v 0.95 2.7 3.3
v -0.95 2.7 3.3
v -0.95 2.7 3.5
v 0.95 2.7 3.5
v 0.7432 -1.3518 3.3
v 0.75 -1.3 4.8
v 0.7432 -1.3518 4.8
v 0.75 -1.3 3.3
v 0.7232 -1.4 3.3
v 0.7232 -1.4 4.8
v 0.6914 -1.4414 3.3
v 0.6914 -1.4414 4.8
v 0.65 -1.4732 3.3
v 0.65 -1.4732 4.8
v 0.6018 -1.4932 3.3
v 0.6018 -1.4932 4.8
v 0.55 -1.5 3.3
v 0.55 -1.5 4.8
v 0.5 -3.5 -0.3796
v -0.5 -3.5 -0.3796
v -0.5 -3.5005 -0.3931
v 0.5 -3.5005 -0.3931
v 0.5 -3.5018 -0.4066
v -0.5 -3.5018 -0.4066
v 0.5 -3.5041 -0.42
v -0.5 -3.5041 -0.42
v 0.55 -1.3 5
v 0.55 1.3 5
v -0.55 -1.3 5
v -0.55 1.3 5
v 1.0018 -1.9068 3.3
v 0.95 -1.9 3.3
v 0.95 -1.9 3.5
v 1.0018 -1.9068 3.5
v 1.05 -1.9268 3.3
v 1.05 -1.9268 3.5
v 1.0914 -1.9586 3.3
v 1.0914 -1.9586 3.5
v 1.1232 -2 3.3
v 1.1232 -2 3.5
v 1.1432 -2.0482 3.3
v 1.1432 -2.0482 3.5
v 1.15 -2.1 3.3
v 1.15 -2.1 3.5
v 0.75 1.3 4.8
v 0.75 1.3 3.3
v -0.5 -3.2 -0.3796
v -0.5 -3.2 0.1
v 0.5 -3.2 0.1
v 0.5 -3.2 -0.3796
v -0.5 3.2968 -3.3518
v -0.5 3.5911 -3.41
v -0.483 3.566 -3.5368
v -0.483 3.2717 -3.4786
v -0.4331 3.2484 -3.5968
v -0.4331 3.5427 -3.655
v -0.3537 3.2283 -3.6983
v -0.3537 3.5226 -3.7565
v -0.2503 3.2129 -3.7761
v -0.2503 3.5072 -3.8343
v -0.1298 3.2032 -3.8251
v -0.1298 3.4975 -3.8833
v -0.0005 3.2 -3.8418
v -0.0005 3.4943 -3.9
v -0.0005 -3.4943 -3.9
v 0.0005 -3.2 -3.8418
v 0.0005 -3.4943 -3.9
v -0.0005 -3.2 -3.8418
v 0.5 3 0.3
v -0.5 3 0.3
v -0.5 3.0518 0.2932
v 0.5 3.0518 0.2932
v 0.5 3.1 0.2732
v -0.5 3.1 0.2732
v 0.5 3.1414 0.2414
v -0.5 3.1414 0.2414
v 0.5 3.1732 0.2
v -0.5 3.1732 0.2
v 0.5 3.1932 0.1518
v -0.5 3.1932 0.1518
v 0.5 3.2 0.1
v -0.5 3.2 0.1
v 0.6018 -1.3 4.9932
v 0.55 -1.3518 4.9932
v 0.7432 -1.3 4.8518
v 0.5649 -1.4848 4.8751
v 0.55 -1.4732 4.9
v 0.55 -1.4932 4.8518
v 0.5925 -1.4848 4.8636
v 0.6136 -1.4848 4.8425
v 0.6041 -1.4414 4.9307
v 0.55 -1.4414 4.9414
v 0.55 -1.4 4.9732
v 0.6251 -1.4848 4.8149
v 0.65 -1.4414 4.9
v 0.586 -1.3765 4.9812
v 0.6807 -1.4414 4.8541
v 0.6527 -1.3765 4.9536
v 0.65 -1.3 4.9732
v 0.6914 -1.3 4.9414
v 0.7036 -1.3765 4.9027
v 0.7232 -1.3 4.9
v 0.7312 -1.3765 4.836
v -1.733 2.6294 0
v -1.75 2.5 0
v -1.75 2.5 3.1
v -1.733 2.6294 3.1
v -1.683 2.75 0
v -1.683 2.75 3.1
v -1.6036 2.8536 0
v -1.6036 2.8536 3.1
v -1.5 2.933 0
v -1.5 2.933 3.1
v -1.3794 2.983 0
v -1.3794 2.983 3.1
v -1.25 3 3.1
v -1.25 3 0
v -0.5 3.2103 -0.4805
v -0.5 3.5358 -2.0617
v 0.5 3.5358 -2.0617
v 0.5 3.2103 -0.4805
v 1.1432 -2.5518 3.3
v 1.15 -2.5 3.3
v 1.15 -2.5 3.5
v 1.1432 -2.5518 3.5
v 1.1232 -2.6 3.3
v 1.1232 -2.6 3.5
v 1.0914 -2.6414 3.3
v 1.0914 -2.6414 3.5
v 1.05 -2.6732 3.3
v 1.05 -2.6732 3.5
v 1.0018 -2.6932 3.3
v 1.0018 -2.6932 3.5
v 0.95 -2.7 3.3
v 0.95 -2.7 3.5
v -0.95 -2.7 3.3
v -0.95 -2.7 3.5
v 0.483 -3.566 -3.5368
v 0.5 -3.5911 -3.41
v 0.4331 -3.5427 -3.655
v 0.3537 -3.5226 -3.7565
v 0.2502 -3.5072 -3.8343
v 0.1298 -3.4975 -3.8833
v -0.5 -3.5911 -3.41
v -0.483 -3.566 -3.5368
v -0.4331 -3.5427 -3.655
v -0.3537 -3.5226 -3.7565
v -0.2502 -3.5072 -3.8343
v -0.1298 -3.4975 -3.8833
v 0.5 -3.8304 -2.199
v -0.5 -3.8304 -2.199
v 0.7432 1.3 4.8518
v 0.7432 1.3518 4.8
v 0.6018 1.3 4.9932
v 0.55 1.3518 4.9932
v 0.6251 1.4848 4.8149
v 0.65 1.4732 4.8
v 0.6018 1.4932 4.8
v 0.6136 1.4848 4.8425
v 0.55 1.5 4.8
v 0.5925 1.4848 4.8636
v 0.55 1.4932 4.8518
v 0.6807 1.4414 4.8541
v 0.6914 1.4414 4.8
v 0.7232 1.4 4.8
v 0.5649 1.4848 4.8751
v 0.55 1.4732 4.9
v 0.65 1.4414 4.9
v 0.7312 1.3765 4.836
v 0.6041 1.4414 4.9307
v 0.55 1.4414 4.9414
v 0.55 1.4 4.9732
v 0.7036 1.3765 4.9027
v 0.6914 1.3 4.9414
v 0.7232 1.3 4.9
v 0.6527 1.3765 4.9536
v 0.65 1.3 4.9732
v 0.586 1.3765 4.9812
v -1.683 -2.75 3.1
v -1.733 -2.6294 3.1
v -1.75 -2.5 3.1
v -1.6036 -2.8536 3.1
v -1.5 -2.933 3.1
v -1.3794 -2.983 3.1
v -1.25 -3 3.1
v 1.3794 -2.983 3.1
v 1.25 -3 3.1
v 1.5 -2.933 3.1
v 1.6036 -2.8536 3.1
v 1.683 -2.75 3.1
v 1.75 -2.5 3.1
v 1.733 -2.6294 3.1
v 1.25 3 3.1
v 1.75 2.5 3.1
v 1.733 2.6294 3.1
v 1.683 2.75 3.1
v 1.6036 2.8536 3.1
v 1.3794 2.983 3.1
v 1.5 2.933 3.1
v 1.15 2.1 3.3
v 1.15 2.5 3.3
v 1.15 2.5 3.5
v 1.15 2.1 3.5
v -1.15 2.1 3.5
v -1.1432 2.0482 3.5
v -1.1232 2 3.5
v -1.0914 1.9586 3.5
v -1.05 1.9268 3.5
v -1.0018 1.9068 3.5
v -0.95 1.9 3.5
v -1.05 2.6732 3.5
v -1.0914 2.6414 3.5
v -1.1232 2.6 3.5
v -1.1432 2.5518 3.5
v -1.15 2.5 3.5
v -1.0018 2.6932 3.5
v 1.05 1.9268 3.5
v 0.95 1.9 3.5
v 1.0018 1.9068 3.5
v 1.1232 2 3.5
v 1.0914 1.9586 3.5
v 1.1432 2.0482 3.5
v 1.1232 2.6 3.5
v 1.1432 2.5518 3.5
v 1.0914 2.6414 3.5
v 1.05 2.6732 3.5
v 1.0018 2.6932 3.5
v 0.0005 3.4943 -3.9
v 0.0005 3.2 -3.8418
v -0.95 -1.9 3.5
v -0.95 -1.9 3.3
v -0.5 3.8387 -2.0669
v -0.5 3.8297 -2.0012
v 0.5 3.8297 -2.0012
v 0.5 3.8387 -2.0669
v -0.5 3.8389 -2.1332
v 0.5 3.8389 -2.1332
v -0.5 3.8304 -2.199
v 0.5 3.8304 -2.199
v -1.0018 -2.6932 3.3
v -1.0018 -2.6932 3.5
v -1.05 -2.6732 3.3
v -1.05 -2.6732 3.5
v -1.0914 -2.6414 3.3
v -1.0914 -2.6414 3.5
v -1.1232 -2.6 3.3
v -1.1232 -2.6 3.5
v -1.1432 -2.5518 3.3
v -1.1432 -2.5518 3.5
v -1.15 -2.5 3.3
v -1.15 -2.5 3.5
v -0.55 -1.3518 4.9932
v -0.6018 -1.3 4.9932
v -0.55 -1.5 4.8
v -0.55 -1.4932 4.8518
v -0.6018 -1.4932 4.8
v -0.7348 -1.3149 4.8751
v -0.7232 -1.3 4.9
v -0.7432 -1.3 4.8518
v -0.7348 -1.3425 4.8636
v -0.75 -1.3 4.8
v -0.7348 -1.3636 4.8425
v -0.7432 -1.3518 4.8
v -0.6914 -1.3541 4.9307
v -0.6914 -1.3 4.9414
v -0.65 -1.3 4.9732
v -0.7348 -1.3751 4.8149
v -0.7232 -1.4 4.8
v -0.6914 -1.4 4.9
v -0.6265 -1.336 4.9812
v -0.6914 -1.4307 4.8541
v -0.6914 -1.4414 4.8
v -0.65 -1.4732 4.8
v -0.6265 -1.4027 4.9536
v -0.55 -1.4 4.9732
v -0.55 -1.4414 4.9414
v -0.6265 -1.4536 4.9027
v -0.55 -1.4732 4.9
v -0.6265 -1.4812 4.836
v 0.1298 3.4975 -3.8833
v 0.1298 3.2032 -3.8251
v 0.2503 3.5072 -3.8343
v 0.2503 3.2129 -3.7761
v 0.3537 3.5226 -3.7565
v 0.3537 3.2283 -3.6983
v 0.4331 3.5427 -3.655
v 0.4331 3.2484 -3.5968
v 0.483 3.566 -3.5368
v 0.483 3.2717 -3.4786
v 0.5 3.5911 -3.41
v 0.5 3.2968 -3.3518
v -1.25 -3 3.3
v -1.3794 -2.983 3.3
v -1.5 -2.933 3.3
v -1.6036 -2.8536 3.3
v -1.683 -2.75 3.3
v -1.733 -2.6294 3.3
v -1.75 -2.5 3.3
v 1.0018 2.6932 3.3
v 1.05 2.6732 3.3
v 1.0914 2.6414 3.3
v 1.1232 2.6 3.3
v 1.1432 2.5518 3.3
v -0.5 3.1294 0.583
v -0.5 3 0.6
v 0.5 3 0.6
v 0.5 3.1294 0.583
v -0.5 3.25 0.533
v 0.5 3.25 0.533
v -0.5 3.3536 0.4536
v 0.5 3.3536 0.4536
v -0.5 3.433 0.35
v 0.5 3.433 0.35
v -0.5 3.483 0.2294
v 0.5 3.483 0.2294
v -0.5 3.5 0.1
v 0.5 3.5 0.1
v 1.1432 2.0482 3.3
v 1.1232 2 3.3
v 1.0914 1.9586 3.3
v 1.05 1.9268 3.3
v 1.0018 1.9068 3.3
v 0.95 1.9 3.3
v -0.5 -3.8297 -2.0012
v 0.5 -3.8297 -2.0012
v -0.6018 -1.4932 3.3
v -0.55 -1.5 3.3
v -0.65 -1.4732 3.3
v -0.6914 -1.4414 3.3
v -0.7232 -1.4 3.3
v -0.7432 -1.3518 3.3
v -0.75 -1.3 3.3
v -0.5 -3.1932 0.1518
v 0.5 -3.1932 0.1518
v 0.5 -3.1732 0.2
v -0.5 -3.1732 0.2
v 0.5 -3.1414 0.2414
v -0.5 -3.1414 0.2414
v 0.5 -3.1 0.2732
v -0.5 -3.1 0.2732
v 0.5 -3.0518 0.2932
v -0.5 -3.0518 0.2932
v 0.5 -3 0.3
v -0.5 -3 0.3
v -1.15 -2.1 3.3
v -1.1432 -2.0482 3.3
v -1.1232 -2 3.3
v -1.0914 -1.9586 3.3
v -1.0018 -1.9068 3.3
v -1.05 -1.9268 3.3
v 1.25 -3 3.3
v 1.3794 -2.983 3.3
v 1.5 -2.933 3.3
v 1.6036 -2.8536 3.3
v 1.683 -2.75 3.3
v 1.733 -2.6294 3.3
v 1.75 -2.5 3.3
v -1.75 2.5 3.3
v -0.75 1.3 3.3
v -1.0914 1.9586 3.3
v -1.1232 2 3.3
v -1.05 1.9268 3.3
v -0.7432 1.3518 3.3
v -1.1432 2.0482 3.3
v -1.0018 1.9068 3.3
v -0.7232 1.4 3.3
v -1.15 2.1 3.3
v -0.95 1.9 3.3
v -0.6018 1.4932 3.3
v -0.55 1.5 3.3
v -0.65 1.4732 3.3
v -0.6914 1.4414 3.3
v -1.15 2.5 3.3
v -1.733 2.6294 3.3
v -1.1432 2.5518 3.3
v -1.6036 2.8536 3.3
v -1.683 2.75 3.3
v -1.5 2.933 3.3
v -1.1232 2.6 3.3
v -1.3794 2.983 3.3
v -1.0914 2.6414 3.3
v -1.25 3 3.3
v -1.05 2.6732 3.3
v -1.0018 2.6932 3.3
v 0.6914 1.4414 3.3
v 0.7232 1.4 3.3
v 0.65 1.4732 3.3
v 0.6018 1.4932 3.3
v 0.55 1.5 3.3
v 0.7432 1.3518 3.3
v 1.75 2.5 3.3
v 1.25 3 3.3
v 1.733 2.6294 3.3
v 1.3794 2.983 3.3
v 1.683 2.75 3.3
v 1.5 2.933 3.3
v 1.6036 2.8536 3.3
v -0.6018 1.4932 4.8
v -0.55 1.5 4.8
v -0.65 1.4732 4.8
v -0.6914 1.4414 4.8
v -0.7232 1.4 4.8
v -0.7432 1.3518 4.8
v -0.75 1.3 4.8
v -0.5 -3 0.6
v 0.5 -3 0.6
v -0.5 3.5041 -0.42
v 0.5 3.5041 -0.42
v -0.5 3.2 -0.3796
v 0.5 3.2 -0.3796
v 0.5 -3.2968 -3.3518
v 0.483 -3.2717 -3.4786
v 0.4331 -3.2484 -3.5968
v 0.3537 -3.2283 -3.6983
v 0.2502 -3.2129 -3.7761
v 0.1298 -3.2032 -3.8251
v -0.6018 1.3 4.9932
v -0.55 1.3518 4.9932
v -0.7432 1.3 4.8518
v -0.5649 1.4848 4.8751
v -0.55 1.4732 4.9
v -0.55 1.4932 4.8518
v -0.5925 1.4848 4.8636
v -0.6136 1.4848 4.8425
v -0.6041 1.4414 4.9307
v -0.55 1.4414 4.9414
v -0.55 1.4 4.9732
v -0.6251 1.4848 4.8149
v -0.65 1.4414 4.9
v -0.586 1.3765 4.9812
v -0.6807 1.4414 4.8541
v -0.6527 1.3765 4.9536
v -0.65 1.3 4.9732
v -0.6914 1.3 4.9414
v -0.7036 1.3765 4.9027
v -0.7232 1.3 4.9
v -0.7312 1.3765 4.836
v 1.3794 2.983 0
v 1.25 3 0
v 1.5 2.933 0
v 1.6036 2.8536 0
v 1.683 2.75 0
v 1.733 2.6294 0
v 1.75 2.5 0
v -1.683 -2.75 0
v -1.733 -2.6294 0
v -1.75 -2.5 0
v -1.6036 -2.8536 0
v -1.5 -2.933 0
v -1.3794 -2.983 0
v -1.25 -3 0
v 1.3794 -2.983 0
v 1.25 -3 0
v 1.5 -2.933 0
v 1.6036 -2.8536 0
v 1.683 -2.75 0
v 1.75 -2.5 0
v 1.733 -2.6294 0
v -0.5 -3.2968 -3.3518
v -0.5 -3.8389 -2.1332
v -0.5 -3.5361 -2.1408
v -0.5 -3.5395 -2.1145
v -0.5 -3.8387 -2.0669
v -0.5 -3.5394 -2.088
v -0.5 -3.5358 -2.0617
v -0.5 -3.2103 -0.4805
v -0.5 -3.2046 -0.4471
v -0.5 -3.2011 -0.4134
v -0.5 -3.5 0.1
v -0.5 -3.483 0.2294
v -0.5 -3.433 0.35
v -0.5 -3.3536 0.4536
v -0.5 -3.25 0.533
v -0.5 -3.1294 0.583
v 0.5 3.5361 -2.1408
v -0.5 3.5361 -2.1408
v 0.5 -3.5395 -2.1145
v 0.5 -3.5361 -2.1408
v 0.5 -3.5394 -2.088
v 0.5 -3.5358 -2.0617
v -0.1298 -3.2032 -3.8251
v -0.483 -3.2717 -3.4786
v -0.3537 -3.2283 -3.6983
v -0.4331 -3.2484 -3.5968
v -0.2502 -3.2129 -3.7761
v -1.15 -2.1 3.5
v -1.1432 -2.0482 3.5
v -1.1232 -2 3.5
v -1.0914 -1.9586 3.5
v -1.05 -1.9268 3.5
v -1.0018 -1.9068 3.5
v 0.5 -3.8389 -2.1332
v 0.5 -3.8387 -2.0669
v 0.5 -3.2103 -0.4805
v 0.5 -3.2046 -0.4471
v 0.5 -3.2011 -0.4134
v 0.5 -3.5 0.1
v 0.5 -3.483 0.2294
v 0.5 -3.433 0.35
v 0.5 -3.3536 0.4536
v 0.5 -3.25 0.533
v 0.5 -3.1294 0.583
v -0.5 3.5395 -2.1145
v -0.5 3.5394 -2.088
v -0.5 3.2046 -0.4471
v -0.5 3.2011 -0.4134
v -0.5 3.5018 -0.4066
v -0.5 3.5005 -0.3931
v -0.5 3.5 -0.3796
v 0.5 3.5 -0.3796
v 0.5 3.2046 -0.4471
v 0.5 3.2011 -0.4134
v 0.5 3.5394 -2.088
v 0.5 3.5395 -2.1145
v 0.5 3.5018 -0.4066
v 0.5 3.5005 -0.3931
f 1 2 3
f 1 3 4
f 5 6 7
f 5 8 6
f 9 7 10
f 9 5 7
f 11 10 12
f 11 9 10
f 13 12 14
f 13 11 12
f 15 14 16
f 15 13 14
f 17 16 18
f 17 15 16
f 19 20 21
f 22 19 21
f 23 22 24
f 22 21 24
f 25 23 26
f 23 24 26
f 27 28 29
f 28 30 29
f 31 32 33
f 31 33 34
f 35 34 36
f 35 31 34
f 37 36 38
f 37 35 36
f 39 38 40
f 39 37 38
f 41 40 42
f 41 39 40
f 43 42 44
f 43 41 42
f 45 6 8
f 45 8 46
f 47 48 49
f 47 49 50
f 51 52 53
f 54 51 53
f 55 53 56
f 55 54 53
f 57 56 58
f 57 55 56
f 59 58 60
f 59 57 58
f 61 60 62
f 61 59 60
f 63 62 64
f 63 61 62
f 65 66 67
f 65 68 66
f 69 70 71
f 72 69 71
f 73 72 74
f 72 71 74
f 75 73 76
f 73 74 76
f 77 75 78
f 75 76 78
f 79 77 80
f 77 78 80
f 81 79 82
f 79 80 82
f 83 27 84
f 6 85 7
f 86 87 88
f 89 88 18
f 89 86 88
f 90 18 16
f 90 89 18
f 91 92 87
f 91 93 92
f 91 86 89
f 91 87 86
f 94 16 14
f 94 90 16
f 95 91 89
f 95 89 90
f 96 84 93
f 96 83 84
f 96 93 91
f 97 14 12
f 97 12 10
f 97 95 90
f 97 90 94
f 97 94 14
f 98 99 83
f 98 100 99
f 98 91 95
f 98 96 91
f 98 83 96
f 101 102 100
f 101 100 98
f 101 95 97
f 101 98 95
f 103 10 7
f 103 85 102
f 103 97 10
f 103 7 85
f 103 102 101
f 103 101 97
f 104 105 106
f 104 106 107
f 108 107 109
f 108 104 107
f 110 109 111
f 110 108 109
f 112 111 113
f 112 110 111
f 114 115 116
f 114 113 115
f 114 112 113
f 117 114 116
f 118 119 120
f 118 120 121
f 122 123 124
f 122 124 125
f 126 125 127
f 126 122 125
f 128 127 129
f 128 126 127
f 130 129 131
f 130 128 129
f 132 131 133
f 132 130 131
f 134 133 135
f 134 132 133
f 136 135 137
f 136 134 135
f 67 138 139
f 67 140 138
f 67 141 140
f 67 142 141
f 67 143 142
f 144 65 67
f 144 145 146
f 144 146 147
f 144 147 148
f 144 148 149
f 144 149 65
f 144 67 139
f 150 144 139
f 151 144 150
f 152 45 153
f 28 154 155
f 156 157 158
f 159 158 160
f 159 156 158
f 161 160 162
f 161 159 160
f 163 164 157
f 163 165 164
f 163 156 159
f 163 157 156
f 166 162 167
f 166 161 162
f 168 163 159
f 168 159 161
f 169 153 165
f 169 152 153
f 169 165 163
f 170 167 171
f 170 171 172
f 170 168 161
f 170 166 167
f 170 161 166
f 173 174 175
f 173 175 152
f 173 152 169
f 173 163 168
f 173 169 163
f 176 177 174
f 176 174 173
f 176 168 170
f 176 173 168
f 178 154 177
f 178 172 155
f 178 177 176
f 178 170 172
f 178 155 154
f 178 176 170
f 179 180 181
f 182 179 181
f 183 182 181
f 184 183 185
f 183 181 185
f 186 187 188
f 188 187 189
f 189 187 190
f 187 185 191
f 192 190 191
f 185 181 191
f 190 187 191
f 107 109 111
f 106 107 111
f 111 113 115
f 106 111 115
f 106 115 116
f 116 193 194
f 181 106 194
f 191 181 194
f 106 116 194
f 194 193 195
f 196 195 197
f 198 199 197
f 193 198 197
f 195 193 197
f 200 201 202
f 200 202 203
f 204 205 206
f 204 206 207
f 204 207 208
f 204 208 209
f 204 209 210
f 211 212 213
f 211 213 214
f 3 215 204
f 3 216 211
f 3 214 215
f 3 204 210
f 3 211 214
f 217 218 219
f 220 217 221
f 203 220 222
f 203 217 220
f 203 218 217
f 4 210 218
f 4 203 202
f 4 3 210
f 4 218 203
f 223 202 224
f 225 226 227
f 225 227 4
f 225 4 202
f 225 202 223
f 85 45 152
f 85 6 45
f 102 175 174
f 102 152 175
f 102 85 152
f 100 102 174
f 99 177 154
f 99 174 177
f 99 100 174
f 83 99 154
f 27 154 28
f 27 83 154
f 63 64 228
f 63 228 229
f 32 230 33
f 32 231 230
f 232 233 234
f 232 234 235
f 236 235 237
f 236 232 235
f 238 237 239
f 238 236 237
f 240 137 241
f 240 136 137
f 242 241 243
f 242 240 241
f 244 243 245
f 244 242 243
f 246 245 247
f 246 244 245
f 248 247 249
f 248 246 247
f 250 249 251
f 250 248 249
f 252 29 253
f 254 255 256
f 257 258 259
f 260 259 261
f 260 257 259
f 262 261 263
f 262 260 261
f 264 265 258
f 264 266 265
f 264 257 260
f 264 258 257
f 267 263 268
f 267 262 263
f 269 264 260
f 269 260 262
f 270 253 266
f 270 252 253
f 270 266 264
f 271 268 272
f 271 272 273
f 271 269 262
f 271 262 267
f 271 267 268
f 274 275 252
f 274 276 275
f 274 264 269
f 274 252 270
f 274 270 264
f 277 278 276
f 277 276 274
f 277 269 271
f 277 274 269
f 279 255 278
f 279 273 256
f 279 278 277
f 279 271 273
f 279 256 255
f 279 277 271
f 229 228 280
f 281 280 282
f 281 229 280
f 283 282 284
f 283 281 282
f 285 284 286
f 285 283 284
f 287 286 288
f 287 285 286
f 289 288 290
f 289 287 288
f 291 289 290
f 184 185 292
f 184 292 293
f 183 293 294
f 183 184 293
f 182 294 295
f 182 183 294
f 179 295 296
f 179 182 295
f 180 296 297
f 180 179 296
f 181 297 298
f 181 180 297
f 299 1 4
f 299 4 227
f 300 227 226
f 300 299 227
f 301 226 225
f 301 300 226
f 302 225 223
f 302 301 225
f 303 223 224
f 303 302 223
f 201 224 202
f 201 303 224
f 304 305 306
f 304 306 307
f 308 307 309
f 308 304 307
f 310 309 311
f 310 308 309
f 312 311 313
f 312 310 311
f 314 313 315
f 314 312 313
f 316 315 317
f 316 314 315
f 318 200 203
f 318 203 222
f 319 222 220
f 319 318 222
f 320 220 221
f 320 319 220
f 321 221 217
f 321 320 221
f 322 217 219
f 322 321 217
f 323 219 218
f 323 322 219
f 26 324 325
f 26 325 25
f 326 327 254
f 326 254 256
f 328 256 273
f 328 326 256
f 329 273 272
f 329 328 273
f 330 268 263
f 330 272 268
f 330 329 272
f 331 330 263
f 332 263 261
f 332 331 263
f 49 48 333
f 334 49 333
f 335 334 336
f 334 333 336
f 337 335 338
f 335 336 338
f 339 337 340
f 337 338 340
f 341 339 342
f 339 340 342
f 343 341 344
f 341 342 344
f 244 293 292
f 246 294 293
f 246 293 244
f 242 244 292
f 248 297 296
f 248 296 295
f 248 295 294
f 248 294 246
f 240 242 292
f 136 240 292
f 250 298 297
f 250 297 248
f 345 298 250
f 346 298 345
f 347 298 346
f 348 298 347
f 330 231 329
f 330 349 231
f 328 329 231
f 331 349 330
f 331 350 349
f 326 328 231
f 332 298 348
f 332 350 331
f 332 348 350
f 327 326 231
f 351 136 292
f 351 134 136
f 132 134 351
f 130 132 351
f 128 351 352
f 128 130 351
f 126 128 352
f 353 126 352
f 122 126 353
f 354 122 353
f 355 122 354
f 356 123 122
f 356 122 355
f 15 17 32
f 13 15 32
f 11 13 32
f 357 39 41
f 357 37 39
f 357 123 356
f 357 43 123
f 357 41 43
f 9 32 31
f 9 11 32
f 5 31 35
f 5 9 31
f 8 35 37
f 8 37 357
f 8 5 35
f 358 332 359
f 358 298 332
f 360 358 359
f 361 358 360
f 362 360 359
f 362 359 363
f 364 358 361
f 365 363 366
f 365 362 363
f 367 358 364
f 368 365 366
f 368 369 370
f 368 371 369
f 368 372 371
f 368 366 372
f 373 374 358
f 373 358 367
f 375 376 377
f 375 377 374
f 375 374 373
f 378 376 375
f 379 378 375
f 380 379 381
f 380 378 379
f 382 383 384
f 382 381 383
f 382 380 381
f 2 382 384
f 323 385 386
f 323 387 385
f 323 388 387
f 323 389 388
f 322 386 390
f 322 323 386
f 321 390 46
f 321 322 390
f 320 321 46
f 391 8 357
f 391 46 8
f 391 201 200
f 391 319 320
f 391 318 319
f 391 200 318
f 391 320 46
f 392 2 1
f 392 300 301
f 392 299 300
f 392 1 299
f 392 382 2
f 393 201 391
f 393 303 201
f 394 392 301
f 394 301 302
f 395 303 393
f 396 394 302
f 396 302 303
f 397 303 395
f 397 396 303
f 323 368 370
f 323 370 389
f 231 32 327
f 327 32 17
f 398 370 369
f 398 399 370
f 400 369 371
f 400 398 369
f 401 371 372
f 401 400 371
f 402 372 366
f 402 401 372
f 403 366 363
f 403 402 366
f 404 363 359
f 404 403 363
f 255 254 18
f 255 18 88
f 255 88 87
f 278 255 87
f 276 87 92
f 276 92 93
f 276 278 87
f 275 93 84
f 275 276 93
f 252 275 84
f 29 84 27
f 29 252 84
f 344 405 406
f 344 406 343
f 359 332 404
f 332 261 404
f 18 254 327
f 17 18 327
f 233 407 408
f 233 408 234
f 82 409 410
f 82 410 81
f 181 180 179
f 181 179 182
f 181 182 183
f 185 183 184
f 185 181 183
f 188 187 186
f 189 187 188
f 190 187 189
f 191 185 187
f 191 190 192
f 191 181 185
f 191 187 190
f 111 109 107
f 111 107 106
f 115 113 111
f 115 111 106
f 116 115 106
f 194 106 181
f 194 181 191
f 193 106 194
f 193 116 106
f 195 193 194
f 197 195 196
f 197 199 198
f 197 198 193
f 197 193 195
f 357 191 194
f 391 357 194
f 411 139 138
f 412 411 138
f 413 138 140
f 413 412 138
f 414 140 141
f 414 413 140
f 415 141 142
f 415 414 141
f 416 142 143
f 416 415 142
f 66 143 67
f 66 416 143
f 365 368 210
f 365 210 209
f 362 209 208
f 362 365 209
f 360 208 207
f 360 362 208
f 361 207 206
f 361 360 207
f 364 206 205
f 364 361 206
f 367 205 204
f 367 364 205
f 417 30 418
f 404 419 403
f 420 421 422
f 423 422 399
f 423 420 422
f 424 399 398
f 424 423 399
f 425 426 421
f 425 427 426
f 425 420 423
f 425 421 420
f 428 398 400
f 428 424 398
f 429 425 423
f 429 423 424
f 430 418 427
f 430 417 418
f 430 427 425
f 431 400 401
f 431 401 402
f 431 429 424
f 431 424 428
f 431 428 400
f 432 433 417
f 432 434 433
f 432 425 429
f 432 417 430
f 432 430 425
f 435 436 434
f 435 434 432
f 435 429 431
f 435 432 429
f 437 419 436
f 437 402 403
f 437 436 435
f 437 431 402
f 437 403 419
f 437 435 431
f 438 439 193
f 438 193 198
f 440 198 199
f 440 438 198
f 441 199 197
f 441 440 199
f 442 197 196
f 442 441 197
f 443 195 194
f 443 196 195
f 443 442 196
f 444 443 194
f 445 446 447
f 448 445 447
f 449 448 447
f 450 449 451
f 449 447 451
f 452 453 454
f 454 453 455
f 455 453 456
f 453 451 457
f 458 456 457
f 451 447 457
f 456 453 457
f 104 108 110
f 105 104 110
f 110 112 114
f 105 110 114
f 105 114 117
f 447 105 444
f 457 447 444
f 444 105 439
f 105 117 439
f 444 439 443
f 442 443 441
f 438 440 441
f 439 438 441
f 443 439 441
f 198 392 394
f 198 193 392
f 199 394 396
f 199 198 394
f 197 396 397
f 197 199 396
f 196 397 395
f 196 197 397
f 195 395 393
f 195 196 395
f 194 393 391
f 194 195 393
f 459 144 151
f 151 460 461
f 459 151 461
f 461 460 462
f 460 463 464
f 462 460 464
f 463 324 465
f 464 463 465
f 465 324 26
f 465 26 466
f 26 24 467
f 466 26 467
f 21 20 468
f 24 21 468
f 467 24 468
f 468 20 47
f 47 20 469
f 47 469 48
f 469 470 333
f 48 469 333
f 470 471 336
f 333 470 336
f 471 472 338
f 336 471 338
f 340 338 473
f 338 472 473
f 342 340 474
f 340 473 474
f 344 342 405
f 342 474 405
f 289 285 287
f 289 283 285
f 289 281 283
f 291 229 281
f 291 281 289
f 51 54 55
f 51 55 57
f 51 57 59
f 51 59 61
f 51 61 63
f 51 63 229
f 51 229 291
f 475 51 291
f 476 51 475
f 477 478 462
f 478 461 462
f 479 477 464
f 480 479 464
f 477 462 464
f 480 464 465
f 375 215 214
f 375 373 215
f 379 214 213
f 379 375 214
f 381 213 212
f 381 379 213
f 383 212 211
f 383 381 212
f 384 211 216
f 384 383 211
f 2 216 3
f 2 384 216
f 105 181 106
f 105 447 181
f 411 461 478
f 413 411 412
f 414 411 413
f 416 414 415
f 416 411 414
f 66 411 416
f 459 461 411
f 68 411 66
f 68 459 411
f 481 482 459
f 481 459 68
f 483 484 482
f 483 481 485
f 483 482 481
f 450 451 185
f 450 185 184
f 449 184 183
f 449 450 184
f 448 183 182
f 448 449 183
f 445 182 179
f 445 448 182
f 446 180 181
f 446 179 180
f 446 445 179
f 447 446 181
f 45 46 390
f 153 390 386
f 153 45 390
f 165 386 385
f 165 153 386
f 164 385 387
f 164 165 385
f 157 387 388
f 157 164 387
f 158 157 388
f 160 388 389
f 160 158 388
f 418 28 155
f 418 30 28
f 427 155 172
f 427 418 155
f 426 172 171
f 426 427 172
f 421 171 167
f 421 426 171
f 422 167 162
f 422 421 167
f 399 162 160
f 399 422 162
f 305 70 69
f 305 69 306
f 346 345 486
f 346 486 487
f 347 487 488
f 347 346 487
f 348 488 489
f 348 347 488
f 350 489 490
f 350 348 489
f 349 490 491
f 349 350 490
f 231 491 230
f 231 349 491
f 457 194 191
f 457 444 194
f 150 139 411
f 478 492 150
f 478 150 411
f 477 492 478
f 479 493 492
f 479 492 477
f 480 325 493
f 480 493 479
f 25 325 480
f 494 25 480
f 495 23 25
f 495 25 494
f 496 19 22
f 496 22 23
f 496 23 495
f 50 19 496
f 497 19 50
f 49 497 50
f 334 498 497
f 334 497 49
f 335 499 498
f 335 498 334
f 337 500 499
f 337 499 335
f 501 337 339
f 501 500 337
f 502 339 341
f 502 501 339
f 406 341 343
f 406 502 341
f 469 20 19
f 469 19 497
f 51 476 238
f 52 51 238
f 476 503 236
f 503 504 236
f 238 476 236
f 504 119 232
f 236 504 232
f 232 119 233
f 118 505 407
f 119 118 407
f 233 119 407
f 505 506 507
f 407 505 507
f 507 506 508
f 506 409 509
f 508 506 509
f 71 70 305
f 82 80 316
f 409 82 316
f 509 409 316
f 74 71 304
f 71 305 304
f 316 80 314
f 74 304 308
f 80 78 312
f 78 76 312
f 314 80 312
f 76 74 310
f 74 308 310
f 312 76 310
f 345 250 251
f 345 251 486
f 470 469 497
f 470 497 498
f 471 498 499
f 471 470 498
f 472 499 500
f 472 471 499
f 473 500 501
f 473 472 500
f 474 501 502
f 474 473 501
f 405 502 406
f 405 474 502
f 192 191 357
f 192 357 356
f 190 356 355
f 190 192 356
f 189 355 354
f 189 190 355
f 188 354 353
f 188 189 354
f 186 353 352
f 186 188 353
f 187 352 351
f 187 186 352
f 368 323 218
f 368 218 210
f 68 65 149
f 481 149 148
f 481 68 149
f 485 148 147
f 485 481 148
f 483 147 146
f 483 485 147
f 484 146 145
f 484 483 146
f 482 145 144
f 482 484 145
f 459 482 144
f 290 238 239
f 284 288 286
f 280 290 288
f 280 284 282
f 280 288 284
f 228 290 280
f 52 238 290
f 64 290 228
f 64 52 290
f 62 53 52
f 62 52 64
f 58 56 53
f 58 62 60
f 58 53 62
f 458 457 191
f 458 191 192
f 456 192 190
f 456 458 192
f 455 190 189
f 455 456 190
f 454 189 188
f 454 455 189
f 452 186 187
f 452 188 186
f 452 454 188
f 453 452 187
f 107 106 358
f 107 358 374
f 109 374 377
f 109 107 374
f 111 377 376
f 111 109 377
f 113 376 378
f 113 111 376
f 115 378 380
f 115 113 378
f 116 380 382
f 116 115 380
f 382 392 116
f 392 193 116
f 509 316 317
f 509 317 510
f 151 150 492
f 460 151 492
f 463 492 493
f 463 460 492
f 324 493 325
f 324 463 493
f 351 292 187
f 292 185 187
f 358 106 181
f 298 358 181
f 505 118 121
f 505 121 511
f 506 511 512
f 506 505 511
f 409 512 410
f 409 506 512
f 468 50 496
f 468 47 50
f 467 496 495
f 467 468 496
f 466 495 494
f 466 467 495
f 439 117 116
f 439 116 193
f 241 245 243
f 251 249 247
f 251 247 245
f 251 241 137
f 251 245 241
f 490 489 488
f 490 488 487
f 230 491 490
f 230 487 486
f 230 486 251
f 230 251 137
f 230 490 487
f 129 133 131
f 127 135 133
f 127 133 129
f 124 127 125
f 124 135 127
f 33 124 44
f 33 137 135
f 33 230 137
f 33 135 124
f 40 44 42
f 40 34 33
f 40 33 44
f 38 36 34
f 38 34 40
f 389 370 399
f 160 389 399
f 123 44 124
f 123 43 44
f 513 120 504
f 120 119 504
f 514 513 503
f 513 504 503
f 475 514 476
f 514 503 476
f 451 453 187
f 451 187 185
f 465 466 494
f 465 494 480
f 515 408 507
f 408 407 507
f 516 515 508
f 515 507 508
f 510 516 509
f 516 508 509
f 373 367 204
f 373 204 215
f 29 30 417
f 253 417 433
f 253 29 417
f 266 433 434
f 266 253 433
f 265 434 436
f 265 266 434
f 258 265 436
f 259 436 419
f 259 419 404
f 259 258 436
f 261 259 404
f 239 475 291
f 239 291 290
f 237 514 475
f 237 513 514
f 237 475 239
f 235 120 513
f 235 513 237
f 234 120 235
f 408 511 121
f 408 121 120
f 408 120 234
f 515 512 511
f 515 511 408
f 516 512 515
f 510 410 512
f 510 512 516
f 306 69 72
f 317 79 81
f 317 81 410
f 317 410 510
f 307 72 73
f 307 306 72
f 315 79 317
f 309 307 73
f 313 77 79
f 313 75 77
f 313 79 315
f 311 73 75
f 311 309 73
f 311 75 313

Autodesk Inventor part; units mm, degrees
ref_plane "YZ Plane" through (0, 0, 0) normal (1, 0, 0) x (0, 1, 0)
ref_plane "XZ Plane" through (0, 0, 0) normal (0, 1, 0) x (-1, 0, 0)
ref_plane "XY Plane" through (0, 0, 0) normal (0, 0, 1) x (1, 0, 0)
sketch "Boceto39" plane through (0, 0, 0) normal (0, 0, 1) x (1, 0, 0)
  line L0 (-1.25, 3) -> (1.25, 3)
  line L1 (1.75, 2.5) -> (1.75, -2.5)
  line L2 (1.25, -3) -> (-1.25, -3)
  line L3 (-1.75, -2.5) -> (-1.75, 2.5)
  arc A0 (1.75, 2.5) -> (1.25, 3) centre (1.25, 2.5) ccw
  arc A1 (-1.25, 3) -> (-1.75, 2.5) centre (-1.25, 2.5) ccw
  arc A2 (-1.75, -2.5) -> (-1.25, -3) centre (-1.25, -2.5) ccw
  arc A3 (1.25, -3) -> (1.75, -2.5) centre (1.25, -2.5) ccw
  point P0 (0, 0)
  point P1 (-1.75, 3)
  point P2 (1.75, -3)
  point P3 (1.75, 3)
  point P4 (-1.75, -3)
  point P5 (0, 3)
  point P6 (1.75, 0)
  dimension "d373" = 3.5
  dimension "d376" = 0.5
  dimension "d437" = 6
extrude "Extrusión13" add sketch "Boceto39" along normal blind 3.1
sketch "Boceto40" plane through (0, 0, 3.1) normal (0, 0, 1) x (1, 0, 0)
  line L0 (1.25, 3) -> (-1.25, 3) projected
  arc A0 (-1.25, 3) -> (-1.75, 2.5) centre (-1.25, 2.5) ccw projected
  line L1 (-1.75, 2.5) -> (-1.75, -2.5) projected
  arc A1 (-1.75, -2.5) -> (-1.25, -3) centre (-1.25, -2.5) ccw projected
  line L2 (-1.25, -3) -> (1.25, -3) projected
  arc A2 (1.25, -3) -> (1.75, -2.5) centre (1.25, -2.5) ccw projected
  line L3 (1.75, -2.5) -> (1.75, 2.5) projected
  arc A3 (1.75, 2.5) -> (1.25, 3) centre (1.25, 2.5) ccw projected
  point P0 (0, 0)
extrude "Extrusión14" add sketch "Boceto40" along normal blind 0.2 separate body
sketch "Boceto43" plane through (0, 0, 0) normal (1, 0, 0) x (0, 1, 0)
  line L0 (0, 0) -> (0, -3.6276) construction
  line L1 (3, 0) -> (3, 3.1) construction
  line L2 (3, 0.6) -> (3, 0.6)
  line L3 (2.5, 3.3) -> (-2.5, 3.3) projected
  line L4 (2.5, 0) -> (-2.5, 0) projected
  line L5 (3.5, 0.1) -> (3.5, -0.3796)
  line L6 (3.5041, -0.42) -> (3.8297, -2.0012)
  line L7 (3.8304, -2.199) -> (3.4943, -3.9)
  line L8 (3.4943, -3.9) -> (3.2, -3.8418)
  line L9 (3.2, -3.8418) -> (3.5361, -2.1408)
  line L10 (3.5358, -2.0617) -> (3.2103, -0.4805)
  line L11 (3.2, -0.3796) -> (3.2, 0.1)
  line L12 (3, 0.3) -> (3, 0.3)
  line L13 (3, 0.3) -> (3, 0.6)
  arc A0 (3.2, 0.1) -> (3, 0.3) centre (3, 0.1) ccw
  arc A1 (3.5, -0.3796) -> (3.5041, -0.42) centre (3.7, -0.3796) ccw
  arc A2 (3.5361, -2.1408) -> (3.5358, -2.0617) centre (3.3399, -2.102) ccw
  arc A3 (3.5, 0.1) -> (3, 0.6) centre (3, 0.1) ccw
  arc A4 (3.2, -0.3796) -> (3.2103, -0.4805) centre (3.7, -0.3796) ccw
  arc A5 (3.8304, -2.199) -> (3.8297, -2.0012) centre (3.3399, -2.102) ccw
  point P0 (3.5, 0.6)
  point P1 (3.5, -0.4)
  point P2 (3.85, -2.1)
  point P3 (3.2, -0.4306)
  dimension "d399" = 2.7
  dimension "d426" = 0.3
  dimension "d427" = 0.3
  dimension "d428" = 0.3
  dimension "d429" = 0.3
  dimension "d430" = 3.85
  dimension "d431" = 3.2
  dimension "d432" = 3.9
  dimension "d433" = 1.8
  dimension "d434" = 1
  dimension "d435" = 0.2
  dimension "d436" = 0.5
extrude "Extrusión15" add sketch "Boceto43" along normal mid plane 1 separate body
fillet "Empalme44" radius 0.5 2 edges at (0.5, 3.3472, -3.8709) (-0.5, 3.3472, -3.8709)
mirror "Simetría1" about plane through (0, 0, 0) normal (0, 1, 0) of "Extrusión15", "Empalme44" bodies 3
sketch "Boceto49" plane through (0, 0, 3.3) normal (0, 0, 1) x (1, 0, 0)
  line L0 (0.95, -2.7) -> (-0.95, -2.7)
  line L1 (-1.15, -2.5) -> (-1.15, -2.1)
  line L2 (-0.95, -1.9) -> (0.95, -1.9)
  line L3 (1.15, -2.1) -> (1.15, -2.5)
  line L4 (0.95, 1.9) -> (-0.95, 1.9)
  line L5 (-1.15, 2.1) -> (-1.15, 2.5)
  line L6 (-0.95, 2.7) -> (0.95, 2.7)
  line L7 (1.15, 2.5) -> (1.15, 2.1)
  arc A0 (0.95, -2.7) -> (1.15, -2.5) centre (0.95, -2.5) ccw
  arc A1 (1.15, -2.1) -> (0.95, -1.9) centre (0.95, -2.1) ccw
  arc A2 (-0.95, -1.9) -> (-1.15, -2.1) centre (-0.95, -2.1) ccw
  arc A3 (-1.15, -2.5) -> (-0.95, -2.7) centre (-0.95, -2.5) ccw
  arc A4 (-1.15, 2.1) -> (-0.95, 1.9) centre (-0.95, 2.1) ccw
  arc A5 (-0.95, 2.7) -> (-1.15, 2.5) centre (-0.95, 2.5) ccw
  arc A6 (1.15, 2.5) -> (0.95, 2.7) centre (0.95, 2.5) ccw
  arc A7 (0.95, 1.9) -> (1.15, 2.1) centre (0.95, 2.1) ccw
  line L8 (-1.15, 2.3) -> (1.15, 2.3) construction
  line L9 (-1.15, -2.3) -> (1.15, -2.3) construction
  line L10 (0.1537, -1.5) -> (-0.1537, -1.5) construction
  line L11 (-0.1537, -1.5) -> (-0.1537, 1.5) construction
  line L12 (-0.1537, 1.5) -> (0.1537, 1.5) construction
  line L13 (0.1537, 1.5) -> (0.1537, -1.5) construction
  point P0 (0, 0)
  point P1 (1.15, 1.9)
  point P2 (0, -2.7)
  point P3 (0, 1.9)
  point P4 (0, -1.5)
  point P5 (0.1537, 0)
  dimension "d438" = 0.8
  dimension "d439" = 0.2
  dimension "d441" = 2.3
  dimension "d442" = 2.3
  dimension "d443" = 3
  dimension "d444" = 2.3
extrude "Extrusión19" add sketch "Boceto49" along normal blind 0.2 bodies 2
sketch "Boceto50" plane through (0, 0, 0) normal (1, 0, 0) x (0, 1, 0)
  line L0 (-2.5, 3.3) -> (2.5, 3.3) projected
  line L1 (-1.5, 3.3) -> (1.5, 3.3)
  line L2 (1.5, 3.3) -> (1.5, 5)
  line L3 (1.5, 5) -> (-1.5, 5)
  line L4 (-1.5, 5) -> (-1.5, 3.3)
  line L5 (2.5, 0) -> (-2.5, 0) projected
  point P0 (0, 0)
  point P1 (0, 5)
  dimension "d447" = 5
  dimension "d448" = 3
extrude "Extrusión20" add sketch "Boceto50" along normal mid plane 1.5 bodies 2
fillet "Empalme45" radius 0.2 8 edges at (0.75, 0, 5) (0, -1.5, 5) (-0.75, 0, 5) (0, 1.5, 5) (0.75, 1.5, 4.15) (-0.75, 1.5, 4.15) (0.75, -1.5, 4.15) (-0.75, -1.5, 4.15)
properties part number "TACT-SWITCH-THT-3X6MM"
